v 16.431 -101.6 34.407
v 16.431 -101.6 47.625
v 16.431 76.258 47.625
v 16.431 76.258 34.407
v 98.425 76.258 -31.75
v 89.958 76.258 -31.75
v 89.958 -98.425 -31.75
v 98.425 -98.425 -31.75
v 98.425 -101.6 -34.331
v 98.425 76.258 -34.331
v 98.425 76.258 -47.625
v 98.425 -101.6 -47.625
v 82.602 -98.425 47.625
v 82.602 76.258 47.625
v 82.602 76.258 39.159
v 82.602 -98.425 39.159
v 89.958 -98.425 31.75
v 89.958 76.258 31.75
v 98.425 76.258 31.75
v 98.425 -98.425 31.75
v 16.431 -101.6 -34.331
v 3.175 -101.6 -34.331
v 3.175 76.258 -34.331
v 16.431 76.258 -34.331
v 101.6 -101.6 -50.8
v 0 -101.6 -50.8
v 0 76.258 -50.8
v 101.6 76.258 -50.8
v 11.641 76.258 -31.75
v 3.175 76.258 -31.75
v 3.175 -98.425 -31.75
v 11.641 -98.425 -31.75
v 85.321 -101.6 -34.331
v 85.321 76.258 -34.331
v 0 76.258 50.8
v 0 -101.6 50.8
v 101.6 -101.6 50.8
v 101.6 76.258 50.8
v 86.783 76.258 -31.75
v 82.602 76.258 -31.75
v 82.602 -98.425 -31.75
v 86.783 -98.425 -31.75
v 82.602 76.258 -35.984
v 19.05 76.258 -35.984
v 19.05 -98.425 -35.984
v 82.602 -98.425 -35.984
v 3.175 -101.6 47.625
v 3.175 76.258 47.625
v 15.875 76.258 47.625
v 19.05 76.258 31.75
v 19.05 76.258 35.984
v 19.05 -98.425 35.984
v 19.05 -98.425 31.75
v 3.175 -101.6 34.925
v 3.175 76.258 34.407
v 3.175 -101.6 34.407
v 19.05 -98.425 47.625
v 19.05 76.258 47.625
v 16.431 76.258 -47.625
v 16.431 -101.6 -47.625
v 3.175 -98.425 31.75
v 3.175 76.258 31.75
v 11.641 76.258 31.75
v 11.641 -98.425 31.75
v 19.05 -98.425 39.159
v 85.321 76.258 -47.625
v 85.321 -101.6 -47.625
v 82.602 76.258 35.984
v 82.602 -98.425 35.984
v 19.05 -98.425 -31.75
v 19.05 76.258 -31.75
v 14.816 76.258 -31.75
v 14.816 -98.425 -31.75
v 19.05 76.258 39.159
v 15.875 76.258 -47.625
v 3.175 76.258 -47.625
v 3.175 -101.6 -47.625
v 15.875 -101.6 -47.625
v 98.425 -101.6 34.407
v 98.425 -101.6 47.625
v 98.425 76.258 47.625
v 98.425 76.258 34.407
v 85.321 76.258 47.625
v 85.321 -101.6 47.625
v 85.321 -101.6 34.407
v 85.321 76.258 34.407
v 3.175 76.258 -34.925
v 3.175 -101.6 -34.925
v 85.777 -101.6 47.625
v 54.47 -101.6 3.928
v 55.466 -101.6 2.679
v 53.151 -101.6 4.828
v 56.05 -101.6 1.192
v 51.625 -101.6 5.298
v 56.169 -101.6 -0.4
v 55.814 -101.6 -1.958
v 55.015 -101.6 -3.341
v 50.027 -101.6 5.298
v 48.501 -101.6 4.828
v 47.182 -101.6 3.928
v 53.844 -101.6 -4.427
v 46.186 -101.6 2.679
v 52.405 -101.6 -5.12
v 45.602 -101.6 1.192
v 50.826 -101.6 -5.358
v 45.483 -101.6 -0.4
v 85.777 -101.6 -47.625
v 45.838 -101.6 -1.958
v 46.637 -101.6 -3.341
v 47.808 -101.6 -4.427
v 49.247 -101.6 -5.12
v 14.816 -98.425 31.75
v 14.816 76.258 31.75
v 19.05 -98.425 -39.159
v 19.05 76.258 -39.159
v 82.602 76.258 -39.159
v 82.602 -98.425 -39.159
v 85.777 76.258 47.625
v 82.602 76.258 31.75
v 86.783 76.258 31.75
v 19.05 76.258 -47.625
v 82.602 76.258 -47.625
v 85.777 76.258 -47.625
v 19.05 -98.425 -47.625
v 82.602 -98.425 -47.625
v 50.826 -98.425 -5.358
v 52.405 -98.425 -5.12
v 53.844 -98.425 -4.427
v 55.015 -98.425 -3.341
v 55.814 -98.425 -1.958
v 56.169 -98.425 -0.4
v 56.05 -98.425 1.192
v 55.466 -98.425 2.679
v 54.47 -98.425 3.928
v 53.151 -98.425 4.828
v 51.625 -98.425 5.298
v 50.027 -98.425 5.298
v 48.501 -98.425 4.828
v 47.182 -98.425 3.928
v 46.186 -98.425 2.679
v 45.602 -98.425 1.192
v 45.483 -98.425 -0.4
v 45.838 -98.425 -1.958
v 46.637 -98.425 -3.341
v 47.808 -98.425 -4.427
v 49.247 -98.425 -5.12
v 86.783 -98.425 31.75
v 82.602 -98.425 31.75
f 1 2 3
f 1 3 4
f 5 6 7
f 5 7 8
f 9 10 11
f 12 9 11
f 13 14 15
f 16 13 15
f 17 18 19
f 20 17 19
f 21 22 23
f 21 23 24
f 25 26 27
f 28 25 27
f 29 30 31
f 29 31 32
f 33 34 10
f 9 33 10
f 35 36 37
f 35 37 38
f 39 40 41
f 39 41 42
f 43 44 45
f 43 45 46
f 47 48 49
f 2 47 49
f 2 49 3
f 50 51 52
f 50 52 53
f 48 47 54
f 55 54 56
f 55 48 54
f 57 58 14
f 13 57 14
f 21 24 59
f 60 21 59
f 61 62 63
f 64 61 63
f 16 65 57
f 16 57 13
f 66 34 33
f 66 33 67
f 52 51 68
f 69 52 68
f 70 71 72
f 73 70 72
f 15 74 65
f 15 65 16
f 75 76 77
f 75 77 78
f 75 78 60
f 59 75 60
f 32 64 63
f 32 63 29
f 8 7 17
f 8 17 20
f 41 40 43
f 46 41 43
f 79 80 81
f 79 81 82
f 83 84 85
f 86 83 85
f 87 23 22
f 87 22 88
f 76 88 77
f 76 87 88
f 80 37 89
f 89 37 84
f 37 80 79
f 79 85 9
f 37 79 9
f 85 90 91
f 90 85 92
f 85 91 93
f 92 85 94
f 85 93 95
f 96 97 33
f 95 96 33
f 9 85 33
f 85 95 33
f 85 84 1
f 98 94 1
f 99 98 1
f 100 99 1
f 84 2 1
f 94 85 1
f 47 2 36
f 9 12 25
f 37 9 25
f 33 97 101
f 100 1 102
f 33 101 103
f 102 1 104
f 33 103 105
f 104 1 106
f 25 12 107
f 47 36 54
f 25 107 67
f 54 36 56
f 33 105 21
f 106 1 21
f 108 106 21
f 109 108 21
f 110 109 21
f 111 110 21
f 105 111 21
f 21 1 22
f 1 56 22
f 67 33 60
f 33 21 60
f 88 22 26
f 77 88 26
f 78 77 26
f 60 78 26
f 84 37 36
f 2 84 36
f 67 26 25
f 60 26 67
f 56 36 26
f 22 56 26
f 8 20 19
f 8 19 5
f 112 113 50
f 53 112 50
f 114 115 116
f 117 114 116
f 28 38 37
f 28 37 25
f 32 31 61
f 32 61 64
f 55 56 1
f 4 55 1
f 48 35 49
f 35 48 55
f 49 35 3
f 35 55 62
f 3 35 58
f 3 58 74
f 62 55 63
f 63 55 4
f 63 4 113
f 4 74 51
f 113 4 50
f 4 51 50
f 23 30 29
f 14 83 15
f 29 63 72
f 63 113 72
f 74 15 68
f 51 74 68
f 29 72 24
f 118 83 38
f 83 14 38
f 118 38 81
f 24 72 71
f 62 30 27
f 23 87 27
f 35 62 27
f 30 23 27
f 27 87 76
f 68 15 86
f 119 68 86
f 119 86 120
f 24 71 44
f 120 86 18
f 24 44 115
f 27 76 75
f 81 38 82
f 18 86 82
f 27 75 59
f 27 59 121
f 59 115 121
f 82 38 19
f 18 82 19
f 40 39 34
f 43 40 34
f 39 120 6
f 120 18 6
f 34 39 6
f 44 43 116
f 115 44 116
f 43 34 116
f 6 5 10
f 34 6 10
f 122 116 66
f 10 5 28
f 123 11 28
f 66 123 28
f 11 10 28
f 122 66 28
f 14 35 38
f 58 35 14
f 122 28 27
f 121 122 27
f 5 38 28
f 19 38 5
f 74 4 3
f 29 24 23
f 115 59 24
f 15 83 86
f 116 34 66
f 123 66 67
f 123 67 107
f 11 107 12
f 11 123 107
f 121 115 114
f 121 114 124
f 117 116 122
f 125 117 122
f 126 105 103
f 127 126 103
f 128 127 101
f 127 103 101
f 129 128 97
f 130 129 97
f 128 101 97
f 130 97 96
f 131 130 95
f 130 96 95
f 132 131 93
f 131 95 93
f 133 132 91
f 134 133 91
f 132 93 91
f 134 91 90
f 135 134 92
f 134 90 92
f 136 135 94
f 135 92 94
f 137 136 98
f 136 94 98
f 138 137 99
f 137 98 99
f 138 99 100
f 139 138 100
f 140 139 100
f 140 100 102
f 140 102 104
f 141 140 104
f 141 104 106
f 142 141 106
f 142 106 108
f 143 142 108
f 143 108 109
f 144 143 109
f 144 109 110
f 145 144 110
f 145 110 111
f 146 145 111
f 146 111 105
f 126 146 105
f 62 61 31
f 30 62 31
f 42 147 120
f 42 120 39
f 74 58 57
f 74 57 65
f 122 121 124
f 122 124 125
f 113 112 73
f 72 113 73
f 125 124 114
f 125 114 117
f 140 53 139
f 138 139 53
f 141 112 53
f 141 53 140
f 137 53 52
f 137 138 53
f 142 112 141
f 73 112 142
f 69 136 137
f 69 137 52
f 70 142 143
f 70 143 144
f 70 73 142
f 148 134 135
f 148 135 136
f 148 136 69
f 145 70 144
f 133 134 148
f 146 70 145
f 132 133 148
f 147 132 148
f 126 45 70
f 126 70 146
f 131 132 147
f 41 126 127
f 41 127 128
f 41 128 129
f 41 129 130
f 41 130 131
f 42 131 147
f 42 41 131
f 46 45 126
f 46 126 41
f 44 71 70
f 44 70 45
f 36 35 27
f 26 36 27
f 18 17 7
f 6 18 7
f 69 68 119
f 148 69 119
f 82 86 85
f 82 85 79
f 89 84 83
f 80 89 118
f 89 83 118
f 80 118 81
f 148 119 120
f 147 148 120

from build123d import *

# Parameters (mm, degrees)
SKETCH1_W               = 101.6
SKETCH1_H               = 203.2
BOSS_EXTRUDE1_DEPTH     = 101.6
SKETCH2_W               = 12.7
SKETCH2_H               = 12.7
SKETCH2_W_2             = 12.648057186
CUT_EXTRUDE1_DEPTH      = 203.2
SKETCH3_W               = 4.23418
SKETCH3_H               = 63.5
SKETCH3_W_2             = 63.551942814
SKETCH3_H_2             = 4.23418
SKETCH3_W_3             = 4.181475186
SKETCH3_W_4             = 8.466582
SKETCH3_H_3             = 8.46582
SKETCH3_W_5             = 8.46582
CUT_EXTRUDE2_DEPTH      = 200.025
SKETCH4_W               = 101.6
SKETCH4_H               = 25.341987408
CUT_EXTRUDE3_DEPTH      = 101.6
F_1_2_13_TAPPED_HOLE2_D = 10.71626
SKETCH7_W               = 13.255770889
SKETCH7_H               = 13.293622463
SKETCH7_W_2             = 13.104364594
SKETCH7_H_2             = 13.217919315
CUT_EXTRUDE4_DEPTH      = 190.5


with BuildPart() as part:
    # Sketch1 → Boss-Extrude1 (new body)
    with BuildSketch(Plane(origin=(0, 0, 0), x_dir=(0, 0, -1), z_dir=(1, 0, 0))):
        Rectangle(SKETCH1_W, SKETCH1_H)
    extrude(amount=BOSS_EXTRUDE1_DEPTH)

    # Sketch2 → Cut-Extrude1 (cut)
    with BuildSketch(Plane(origin=(0, 101.6, 0), x_dir=(1, 0, 0), z_dir=(0, 1, 0))):
        with Locations((9.525, 41.275)):
            Rectangle(SKETCH2_W, SKETCH2_H)
        with Locations((9.525, -41.275)):
            Rectangle(SKETCH2_W, SKETCH2_H)
        with Locations((92.100971407, -41.275)):
            Rectangle(SKETCH2_W_2, SKETCH2_H)
        with Locations((92.100971407, 41.275)):
            Rectangle(SKETCH2_W_2, SKETCH2_H)
    extrude(amount=-CUT_EXTRUDE1_DEPTH, mode=Mode.SUBTRACT)

    # Sketch3 → Cut-Extrude2 (cut)
    with BuildSketch(Plane(origin=(0, 101.6, 0), x_dir=(1, 0, 0), z_dir=(0, 1, 0))):
        with Locations((16.93291, 0)):
            Rectangle(SKETCH3_W, SKETCH3_H)
        with Locations((50.825971407, 0)):
            Rectangle(SKETCH3_W_2, SKETCH3_H)
        with Locations((50.825971407, 33.86709)):
            Rectangle(SKETCH3_W_2, SKETCH3_H_2)
        with Locations((84.692680407, 0)):
            Rectangle(SKETCH3_W_3, SKETCH3_H)
        with Locations((94.191709, 0)):
            Rectangle(SKETCH3_W_4, SKETCH3_H)
        with Locations((50.825971407, 43.39209)):
            Rectangle(SKETCH3_W_2, SKETCH3_H_3)
        with Locations((7.40791, 0)):
            Rectangle(SKETCH3_W_5, SKETCH3_H)
        with Locations((50.825971407, -43.39209)):
            Rectangle(SKETCH3_W_2, SKETCH3_H_3)
        with Locations((50.825971407, -33.86709)):
            Rectangle(SKETCH3_W_2, SKETCH3_H_2)
    extrude(amount=-CUT_EXTRUDE2_DEPTH, mode=Mode.SUBTRACT)

    # Sketch4 → Cut-Extrude3 (cut)
    with BuildSketch(Plane(origin=(101.6, 0, 0), x_dir=(0, 0, -1), z_dir=(1, 0, 0))):
        with Locations((0, 88.929006296)):
            Rectangle(SKETCH4_W, SKETCH4_H)
    extrude(amount=-CUT_EXTRUDE3_DEPTH, mode=Mode.SUBTRACT)

    # 1/2-13 Tapped Hole2 (through all)
    with Locations(Plane(origin=(50.825971407, -98.425, 0), x_dir=(0, 0, 1), z_dir=(0, 1, 0))):
        with Locations((0, 0)):
            Hole(F_1_2_13_TAPPED_HOLE2_D / 2)

    # Sketch7 → Cut-Extrude4 (cut)
    with BuildSketch(Plane(origin=(0, 76.258012592, 0), x_dir=(1, 0, 0), z_dir=(0, 1, 0))):
        with Locations((9.802885445, 40.978188769)):
            Rectangle(SKETCH7_W, SKETCH7_H)
        with Locations((91.872817703, 40.978188769)):
            Rectangle(SKETCH7_W_2, SKETCH7_H)
        with Locations((91.872817703, -41.016040343)):
            Rectangle(SKETCH7_W_2, SKETCH7_H_2)
        with Locations((9.802885445, -41.016040343)):
            Rectangle(SKETCH7_W, SKETCH7_H_2)
    extrude(amount=-CUT_EXTRUDE4_DEPTH, mode=Mode.SUBTRACT)


solid = part.part
